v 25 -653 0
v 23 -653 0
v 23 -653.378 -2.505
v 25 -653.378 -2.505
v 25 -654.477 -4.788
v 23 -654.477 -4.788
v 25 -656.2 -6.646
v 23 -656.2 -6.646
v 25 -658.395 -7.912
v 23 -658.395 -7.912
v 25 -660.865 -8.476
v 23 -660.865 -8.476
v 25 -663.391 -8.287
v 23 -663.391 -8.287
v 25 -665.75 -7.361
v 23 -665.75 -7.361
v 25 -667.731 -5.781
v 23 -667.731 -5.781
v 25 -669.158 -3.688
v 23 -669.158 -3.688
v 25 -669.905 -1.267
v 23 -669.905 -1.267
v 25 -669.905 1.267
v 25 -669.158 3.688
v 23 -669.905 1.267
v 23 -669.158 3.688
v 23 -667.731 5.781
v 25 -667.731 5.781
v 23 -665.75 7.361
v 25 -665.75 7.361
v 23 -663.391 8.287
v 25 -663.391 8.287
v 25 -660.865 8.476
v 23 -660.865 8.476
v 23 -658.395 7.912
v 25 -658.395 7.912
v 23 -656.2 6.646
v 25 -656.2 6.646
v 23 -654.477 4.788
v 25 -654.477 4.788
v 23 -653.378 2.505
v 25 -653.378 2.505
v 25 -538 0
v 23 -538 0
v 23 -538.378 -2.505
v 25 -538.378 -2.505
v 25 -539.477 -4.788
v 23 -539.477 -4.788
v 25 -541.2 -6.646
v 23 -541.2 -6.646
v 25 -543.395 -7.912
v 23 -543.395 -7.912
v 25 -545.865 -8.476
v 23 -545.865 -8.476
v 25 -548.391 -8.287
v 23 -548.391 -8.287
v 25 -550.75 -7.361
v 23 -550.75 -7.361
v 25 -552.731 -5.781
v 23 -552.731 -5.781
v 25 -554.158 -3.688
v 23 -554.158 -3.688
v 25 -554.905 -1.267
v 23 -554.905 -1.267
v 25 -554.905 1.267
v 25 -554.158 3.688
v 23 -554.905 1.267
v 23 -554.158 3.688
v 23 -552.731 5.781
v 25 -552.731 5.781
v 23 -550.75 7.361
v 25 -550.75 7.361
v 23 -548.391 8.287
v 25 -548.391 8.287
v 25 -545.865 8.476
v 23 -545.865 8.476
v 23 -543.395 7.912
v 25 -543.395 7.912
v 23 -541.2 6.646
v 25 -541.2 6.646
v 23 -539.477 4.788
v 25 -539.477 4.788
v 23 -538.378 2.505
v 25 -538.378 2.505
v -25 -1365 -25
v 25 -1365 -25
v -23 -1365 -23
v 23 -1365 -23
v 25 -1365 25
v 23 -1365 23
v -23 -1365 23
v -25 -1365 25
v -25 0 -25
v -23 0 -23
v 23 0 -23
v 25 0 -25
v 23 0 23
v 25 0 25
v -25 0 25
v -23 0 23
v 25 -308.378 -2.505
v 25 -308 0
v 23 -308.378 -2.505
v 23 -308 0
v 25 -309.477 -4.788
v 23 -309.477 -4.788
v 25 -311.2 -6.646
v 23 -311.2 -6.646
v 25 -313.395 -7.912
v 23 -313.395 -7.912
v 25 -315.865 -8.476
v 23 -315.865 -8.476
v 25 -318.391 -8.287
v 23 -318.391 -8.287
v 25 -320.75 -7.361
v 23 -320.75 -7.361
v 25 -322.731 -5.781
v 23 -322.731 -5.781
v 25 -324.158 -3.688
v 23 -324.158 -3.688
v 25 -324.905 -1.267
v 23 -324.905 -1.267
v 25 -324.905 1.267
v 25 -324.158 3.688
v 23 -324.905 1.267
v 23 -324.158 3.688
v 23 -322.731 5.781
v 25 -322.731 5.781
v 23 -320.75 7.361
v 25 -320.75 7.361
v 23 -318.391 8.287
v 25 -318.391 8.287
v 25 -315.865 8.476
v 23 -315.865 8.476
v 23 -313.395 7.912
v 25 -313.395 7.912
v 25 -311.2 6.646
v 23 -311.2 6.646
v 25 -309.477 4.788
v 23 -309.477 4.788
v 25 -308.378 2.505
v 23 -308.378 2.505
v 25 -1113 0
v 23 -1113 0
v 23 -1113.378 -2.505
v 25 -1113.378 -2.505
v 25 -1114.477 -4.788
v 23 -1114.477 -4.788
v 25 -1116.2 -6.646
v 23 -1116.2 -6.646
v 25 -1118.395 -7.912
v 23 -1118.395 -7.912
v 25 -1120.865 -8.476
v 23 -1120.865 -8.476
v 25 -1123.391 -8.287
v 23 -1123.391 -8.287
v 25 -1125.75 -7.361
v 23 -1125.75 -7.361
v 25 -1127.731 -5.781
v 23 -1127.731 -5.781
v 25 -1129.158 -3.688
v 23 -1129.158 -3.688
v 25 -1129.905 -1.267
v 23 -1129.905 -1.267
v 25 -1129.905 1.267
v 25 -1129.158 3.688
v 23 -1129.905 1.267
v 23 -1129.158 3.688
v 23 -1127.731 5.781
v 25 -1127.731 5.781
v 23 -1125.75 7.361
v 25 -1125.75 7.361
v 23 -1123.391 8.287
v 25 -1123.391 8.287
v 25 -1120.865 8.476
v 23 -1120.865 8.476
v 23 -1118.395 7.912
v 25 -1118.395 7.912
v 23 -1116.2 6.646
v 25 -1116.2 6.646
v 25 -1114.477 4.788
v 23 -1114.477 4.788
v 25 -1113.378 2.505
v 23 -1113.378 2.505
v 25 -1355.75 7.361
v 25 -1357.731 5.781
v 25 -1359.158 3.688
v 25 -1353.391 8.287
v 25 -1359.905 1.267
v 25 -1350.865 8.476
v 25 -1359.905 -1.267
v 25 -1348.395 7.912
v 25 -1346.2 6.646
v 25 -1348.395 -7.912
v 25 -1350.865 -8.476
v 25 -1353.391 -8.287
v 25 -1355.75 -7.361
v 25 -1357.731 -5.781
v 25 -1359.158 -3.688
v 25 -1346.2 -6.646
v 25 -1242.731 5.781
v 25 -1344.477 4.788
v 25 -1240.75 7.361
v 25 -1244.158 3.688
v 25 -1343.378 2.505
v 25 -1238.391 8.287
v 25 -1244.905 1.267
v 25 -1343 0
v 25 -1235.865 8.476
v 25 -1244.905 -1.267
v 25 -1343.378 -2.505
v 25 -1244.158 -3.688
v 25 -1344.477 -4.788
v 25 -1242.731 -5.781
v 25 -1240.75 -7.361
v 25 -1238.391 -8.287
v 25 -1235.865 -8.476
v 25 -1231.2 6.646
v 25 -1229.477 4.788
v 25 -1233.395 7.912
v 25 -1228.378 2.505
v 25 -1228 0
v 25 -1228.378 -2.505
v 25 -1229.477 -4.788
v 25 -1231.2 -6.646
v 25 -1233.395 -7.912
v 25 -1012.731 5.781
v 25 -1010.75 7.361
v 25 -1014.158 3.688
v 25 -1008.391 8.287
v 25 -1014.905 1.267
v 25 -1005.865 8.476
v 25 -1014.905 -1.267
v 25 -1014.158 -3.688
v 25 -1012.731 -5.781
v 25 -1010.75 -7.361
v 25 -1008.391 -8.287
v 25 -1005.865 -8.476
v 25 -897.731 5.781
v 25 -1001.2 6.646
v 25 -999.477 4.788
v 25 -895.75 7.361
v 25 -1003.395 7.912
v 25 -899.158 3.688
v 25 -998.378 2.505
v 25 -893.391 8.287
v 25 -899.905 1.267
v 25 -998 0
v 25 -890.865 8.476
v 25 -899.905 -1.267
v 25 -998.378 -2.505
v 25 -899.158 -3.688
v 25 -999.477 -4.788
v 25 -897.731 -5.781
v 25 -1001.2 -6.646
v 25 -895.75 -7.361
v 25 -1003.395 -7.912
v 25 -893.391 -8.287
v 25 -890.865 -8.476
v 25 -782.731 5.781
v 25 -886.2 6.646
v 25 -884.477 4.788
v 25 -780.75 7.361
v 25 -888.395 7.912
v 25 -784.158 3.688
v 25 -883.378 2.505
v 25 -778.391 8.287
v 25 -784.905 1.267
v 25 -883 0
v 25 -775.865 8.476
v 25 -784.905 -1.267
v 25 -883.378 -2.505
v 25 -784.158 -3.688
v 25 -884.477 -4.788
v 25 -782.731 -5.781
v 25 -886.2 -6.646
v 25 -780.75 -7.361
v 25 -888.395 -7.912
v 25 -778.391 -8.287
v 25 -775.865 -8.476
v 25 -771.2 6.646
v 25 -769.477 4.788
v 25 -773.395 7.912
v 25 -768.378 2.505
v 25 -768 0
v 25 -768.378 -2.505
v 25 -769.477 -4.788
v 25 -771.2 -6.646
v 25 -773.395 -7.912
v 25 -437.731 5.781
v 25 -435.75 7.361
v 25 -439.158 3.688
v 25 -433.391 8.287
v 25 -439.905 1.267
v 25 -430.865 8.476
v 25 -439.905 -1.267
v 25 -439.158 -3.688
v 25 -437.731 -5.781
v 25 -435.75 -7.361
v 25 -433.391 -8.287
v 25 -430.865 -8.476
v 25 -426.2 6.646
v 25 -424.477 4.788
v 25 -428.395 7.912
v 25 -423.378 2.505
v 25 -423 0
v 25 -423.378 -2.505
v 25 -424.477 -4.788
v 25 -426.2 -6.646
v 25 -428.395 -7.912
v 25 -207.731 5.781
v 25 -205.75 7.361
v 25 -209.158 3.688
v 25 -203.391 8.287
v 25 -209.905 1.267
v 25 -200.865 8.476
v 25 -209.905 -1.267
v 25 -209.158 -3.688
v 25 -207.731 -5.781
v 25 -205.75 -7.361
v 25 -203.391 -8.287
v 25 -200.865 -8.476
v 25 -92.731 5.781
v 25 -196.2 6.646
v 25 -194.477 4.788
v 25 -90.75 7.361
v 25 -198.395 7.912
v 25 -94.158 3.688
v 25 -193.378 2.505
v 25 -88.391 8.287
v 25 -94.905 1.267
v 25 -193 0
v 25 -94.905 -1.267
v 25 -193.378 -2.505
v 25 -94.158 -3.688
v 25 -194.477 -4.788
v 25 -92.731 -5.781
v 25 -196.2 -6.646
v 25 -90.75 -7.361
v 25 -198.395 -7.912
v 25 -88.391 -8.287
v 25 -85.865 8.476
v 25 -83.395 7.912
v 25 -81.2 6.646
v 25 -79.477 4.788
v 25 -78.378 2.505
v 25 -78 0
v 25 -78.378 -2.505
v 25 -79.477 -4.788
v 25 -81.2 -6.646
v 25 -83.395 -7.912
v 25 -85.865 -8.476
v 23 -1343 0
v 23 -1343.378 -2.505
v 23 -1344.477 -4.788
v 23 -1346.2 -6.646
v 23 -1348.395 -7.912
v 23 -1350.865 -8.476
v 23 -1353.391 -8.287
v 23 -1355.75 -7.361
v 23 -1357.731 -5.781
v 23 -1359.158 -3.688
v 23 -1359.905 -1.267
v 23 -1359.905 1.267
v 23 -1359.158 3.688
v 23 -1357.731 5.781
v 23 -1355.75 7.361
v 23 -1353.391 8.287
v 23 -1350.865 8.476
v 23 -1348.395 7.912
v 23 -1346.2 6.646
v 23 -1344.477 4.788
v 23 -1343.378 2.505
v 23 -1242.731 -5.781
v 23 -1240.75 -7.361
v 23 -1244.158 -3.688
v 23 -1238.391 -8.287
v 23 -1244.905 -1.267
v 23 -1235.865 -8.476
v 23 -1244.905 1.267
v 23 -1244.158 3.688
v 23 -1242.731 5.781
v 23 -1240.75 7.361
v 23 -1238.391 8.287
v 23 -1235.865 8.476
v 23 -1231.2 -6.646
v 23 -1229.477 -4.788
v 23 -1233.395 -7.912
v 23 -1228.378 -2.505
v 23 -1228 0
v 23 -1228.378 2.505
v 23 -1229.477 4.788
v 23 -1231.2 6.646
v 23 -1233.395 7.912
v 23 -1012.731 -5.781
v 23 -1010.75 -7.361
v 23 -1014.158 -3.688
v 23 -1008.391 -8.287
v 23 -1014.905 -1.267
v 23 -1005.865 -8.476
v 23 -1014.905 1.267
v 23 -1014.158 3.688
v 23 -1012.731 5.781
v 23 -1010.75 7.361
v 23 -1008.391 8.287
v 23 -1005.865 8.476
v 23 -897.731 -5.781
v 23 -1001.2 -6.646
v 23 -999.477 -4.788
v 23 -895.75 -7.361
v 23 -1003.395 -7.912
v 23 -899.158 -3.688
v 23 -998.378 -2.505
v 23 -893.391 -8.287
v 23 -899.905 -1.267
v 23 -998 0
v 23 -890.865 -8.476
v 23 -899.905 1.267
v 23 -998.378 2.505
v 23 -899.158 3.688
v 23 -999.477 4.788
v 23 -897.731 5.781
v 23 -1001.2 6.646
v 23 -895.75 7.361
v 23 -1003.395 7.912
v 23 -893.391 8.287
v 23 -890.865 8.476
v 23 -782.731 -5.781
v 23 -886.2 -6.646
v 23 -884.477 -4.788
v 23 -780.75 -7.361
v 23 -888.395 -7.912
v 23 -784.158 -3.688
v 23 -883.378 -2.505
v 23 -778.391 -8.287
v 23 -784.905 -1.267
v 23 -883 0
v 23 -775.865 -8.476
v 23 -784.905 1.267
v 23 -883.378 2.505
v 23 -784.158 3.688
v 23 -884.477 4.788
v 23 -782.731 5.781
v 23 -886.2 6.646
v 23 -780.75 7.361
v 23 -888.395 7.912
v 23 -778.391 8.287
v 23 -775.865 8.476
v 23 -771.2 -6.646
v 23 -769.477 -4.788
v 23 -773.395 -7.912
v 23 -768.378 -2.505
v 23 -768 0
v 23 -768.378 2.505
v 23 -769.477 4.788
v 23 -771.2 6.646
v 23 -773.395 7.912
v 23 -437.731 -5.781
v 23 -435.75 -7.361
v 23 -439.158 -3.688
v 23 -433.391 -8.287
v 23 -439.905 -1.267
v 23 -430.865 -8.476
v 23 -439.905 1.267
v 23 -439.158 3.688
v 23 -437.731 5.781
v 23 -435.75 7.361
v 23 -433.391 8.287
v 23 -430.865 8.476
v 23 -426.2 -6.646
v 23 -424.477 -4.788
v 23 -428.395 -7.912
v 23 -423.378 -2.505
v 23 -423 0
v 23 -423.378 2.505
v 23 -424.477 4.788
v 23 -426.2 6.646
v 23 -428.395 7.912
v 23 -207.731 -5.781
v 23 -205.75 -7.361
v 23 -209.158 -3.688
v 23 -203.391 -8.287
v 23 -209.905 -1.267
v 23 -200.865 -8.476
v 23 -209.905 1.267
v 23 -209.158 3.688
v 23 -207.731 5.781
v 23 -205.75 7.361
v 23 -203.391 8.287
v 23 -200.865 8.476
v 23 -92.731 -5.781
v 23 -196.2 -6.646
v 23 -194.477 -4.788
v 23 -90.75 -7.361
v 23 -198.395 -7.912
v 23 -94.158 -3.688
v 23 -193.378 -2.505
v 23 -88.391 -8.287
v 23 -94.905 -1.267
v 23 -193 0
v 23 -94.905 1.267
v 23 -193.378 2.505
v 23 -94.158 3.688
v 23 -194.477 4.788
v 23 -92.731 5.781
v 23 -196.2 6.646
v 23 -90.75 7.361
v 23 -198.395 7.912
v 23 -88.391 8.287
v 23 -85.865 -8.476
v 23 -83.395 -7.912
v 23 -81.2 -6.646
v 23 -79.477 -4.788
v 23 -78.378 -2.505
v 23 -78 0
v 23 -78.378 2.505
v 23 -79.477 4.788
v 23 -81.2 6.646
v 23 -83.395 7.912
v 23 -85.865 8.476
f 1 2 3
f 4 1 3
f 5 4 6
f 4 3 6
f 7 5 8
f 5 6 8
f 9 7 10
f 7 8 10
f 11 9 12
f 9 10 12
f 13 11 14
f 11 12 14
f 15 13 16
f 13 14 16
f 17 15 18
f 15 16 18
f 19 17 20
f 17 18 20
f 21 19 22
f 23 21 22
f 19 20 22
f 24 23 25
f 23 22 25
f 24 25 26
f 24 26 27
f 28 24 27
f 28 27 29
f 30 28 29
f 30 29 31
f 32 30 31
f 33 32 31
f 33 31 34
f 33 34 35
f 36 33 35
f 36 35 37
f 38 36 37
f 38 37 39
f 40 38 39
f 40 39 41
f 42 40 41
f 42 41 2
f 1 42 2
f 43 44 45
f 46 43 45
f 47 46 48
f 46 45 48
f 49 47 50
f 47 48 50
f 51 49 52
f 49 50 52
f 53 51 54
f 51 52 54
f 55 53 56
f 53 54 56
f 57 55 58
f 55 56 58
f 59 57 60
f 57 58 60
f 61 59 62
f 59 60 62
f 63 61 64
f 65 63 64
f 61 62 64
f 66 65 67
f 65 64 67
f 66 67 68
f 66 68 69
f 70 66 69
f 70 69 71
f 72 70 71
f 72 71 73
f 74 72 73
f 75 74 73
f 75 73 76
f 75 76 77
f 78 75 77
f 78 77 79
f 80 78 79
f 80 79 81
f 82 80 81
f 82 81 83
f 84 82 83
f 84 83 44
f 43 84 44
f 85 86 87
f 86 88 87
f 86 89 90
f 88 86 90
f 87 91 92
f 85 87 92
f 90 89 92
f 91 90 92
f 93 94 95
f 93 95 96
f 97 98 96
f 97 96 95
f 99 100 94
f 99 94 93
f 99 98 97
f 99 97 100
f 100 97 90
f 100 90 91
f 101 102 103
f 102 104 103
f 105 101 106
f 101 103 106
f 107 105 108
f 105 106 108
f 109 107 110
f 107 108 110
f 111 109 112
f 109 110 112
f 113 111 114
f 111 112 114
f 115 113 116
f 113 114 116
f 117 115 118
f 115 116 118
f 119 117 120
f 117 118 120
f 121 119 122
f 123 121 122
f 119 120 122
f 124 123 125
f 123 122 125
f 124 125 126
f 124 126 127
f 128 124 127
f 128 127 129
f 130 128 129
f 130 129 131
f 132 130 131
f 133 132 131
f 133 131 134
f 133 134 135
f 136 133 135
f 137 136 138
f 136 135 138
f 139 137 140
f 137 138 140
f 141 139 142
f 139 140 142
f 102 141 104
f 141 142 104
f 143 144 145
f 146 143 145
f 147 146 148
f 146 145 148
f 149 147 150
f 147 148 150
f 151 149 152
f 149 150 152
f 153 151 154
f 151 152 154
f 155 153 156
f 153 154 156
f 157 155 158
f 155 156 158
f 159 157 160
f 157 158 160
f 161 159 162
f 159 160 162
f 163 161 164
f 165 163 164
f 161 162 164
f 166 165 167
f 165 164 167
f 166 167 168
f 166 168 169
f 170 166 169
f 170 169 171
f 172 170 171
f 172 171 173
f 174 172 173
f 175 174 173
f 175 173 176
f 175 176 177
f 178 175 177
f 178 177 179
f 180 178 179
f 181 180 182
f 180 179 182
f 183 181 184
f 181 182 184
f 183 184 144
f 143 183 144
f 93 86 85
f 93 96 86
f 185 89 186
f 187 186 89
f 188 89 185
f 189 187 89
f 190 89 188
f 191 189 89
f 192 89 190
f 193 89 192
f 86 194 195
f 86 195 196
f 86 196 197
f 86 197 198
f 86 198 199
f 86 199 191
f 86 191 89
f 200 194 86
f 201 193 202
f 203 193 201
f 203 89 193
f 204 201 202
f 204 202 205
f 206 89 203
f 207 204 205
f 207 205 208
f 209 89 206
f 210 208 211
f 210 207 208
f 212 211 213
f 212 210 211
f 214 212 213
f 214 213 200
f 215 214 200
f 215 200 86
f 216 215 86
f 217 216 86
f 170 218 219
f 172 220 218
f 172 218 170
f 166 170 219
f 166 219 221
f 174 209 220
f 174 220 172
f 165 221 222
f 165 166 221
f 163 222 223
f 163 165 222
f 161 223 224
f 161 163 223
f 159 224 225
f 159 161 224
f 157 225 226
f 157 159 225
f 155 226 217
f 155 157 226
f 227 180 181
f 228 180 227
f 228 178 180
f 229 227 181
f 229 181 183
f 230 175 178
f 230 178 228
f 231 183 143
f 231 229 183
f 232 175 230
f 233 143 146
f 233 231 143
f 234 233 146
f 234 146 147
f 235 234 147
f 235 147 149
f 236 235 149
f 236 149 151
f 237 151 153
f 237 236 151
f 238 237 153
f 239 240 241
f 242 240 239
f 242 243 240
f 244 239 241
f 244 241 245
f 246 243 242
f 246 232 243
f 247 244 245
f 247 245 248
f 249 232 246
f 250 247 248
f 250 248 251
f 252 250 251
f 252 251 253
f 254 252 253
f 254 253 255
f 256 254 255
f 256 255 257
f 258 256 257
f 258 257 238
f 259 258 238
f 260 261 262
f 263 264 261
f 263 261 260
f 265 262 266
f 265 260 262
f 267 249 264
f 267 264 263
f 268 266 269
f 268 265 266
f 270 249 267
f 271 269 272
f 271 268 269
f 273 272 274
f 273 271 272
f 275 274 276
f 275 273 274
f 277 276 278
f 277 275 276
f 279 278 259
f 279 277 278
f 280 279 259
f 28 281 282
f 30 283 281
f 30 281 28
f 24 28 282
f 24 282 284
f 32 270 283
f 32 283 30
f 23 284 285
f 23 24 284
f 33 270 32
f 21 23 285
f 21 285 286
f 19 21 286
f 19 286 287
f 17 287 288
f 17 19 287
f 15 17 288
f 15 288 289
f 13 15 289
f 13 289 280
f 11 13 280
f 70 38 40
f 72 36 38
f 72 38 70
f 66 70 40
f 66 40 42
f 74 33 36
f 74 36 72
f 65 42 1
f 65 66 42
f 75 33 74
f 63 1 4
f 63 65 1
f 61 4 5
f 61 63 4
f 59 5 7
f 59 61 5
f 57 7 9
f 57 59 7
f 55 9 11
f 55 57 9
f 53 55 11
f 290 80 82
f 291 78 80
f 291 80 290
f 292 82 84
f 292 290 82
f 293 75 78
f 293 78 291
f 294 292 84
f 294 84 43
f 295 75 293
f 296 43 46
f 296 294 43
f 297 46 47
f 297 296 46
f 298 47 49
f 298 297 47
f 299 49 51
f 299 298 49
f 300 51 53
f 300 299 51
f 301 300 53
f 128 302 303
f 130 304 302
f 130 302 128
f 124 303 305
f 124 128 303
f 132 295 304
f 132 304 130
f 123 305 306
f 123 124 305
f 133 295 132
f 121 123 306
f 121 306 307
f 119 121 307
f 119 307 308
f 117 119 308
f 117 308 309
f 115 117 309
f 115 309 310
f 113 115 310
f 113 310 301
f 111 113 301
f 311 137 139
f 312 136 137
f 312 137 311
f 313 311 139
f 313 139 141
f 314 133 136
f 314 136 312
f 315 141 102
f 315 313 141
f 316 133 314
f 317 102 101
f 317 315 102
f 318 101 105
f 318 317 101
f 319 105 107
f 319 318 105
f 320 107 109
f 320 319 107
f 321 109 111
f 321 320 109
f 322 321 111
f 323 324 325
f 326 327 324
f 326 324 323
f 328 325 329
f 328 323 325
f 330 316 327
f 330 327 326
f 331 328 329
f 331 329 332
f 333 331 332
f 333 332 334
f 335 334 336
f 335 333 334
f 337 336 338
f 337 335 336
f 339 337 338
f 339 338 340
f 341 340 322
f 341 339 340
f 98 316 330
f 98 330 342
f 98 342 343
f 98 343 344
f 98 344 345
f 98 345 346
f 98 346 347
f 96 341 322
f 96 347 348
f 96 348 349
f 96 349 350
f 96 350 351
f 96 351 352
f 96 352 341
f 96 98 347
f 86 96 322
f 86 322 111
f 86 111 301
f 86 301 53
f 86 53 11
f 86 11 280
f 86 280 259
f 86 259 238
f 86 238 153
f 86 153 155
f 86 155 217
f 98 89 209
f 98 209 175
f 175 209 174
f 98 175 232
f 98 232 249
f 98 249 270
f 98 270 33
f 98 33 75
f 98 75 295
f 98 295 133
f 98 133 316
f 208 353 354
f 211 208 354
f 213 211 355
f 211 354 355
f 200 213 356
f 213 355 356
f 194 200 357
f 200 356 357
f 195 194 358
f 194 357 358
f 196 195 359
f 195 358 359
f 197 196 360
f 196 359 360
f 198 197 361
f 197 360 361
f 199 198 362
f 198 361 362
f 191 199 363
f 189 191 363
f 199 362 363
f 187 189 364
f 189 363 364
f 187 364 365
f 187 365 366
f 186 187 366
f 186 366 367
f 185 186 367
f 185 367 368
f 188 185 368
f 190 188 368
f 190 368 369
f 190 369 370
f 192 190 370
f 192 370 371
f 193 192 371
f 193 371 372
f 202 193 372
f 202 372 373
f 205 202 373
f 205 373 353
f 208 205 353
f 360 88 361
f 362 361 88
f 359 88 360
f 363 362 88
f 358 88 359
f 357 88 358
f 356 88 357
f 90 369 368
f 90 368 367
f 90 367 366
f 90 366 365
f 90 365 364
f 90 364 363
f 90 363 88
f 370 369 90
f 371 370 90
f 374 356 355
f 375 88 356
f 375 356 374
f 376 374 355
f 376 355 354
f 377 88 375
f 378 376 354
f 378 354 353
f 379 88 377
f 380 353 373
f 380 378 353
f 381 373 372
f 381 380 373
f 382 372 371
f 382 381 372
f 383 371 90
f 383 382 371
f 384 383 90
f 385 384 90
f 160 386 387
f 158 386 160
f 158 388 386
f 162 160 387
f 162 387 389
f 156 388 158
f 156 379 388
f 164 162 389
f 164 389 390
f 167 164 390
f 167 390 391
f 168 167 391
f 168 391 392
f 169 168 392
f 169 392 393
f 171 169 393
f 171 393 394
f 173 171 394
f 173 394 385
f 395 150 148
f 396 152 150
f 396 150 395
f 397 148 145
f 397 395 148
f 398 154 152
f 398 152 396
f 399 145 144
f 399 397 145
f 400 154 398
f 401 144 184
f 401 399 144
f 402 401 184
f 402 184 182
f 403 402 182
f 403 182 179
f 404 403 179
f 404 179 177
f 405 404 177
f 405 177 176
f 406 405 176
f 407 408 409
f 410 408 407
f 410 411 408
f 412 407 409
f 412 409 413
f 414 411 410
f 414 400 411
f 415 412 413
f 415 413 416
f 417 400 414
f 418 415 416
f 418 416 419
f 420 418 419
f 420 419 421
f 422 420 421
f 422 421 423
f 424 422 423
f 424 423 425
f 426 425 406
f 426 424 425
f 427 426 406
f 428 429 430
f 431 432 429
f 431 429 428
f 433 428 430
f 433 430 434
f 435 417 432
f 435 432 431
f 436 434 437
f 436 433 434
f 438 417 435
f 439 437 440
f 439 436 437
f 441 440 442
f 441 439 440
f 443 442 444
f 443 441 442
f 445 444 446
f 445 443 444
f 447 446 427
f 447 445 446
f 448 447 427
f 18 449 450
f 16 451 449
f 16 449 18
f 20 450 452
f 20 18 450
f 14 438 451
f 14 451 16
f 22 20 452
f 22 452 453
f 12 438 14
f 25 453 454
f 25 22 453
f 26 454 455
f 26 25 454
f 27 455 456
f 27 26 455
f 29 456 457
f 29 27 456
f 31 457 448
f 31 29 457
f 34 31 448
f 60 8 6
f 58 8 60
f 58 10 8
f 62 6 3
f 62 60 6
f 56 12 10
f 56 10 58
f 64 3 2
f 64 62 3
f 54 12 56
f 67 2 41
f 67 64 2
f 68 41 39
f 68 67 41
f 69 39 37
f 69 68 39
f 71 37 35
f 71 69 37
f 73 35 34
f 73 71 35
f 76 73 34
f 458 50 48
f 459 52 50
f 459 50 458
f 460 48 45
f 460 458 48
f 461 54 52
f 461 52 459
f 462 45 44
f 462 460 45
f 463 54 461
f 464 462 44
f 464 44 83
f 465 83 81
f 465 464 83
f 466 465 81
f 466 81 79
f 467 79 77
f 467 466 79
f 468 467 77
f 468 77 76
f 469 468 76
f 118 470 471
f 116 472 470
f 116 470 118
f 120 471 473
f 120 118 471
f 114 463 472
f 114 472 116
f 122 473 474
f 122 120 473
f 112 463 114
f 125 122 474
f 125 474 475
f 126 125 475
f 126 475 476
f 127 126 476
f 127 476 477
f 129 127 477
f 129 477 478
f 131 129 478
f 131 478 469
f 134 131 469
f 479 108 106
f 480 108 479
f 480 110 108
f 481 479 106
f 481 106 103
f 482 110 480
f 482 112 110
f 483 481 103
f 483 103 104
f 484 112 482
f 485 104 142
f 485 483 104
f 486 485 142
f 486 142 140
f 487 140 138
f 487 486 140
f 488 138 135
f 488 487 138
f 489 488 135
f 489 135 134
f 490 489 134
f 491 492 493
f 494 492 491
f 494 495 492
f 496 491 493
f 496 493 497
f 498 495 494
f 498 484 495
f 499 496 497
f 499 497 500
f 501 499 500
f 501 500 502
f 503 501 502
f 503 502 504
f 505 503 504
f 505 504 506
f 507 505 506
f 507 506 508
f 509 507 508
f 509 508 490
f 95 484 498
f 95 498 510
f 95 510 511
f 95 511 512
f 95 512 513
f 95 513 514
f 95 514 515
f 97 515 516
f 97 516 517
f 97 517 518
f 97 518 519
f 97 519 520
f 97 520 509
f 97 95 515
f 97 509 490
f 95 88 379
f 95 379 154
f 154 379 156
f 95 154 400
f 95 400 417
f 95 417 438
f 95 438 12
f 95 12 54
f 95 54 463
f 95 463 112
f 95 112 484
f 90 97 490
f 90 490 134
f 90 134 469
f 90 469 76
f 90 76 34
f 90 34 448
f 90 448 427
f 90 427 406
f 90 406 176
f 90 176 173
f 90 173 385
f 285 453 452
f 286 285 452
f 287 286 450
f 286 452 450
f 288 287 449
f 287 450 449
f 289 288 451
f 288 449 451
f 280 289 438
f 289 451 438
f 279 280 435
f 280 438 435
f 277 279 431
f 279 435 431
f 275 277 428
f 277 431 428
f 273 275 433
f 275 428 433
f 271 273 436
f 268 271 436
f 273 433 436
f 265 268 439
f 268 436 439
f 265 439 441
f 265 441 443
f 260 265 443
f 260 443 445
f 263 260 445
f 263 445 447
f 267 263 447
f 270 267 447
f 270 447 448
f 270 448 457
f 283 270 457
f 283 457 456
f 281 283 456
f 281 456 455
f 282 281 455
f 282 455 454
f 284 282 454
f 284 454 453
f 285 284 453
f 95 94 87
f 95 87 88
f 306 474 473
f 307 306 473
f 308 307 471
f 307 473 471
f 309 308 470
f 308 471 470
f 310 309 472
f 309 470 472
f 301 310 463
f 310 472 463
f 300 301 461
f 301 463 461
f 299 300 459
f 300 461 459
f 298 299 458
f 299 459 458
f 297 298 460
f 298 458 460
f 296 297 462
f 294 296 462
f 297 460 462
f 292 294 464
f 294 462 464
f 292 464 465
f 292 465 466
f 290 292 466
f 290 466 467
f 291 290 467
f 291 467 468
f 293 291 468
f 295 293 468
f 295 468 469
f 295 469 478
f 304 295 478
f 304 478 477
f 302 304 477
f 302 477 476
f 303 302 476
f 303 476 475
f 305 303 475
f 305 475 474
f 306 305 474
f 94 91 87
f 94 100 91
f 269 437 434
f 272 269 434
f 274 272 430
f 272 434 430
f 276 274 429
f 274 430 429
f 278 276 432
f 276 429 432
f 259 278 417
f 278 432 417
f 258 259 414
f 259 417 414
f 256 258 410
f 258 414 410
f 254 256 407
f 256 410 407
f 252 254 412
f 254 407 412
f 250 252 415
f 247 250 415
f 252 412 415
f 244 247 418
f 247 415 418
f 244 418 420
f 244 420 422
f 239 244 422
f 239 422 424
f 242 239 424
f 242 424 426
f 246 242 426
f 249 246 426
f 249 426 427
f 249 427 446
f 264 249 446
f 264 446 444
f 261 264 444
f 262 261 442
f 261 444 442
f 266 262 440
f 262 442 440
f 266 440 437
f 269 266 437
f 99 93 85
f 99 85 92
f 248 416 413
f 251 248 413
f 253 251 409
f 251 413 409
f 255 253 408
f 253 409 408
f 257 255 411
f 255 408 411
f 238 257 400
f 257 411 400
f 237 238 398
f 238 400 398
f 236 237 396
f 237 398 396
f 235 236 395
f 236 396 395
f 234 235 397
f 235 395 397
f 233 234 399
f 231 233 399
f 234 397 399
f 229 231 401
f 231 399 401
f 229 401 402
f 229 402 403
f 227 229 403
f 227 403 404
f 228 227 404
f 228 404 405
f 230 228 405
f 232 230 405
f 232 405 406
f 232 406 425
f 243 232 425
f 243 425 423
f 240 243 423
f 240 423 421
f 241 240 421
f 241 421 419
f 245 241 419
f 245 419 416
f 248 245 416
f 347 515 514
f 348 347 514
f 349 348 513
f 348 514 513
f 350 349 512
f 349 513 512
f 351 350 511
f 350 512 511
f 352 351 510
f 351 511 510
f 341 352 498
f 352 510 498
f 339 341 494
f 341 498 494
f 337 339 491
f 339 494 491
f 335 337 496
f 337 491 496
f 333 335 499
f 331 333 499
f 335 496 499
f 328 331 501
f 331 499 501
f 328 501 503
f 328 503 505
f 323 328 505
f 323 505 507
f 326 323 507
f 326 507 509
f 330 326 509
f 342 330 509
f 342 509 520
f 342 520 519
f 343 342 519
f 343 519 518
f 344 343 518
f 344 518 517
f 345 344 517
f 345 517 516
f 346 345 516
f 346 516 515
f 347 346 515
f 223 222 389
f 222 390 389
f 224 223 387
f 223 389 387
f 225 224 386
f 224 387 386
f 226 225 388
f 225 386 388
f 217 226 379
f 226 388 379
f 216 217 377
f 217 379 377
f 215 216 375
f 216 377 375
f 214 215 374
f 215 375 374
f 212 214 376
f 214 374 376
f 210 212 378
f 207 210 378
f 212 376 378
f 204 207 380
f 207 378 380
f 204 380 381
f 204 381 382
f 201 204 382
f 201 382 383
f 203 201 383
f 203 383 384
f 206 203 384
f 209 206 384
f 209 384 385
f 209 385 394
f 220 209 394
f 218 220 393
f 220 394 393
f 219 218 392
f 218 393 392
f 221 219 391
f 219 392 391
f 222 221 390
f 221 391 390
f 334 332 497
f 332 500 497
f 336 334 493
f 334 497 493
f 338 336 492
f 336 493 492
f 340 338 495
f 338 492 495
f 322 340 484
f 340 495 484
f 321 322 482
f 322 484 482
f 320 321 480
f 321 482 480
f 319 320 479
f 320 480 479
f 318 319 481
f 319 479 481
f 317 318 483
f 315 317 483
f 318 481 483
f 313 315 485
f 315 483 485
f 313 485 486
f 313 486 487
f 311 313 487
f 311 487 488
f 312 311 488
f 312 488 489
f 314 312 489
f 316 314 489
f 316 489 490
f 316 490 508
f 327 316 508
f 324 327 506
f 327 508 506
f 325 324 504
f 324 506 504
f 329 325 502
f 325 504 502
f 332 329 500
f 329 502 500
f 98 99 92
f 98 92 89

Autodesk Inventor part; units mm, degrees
ref_plane "YZ Plane" through (0, 0, 0) normal (1, 0, 0) x (0, 1, 0)
ref_plane "XZ Plane" through (0, 0, 0) normal (0, 1, 0) x (-1, 0, 0)
ref_plane "XY Plane" through (0, 0, 0) normal (0, 0, 1) x (1, 0, 0)
sketch "Sketch9" plane through (0, 0, 0) normal (0, 1, 0) x (-1, 0, 0)
  line L0 (25, 25) -> (-25, 25)
  line L1 (-25, 25) -> (-25, -25)
  line L2 (-25, -25) -> (25, -25)
  line L3 (25, -25) -> (25, 25)
  line L4 (25, 25) -> (-25, -25) construction
  line L5 (-25, 25) -> (25, -25) construction
  line L6 (-23, 23) -> (23, 23)
  line L7 (23, 23) -> (23, -23)
  line L8 (23, -23) -> (-23, -23)
  line L9 (-23, -23) -> (-23, 23)
  point P0 (0, 0)
  dimension "d172" = 50
  dimension "d173" = 50
  dimension "d174" = 2
extrude "Extrusion3" add sketch "Sketch9" against normal blind 1365
sketch "Sketch10" plane through (0, 0, 0) normal (1, 0, 0) x (0, 1, 0)
  line L0 (0, 25) -> (0, -25) construction
  line L1 (0, 25) -> (-1365, 25) construction
  line L2 (-1365, -25) -> (-1365, 25) construction
  line L3 (0, -25) -> (-1365, -25) construction
  line L4 (-1360, 8.5) -> (-1343, 8.5)
  line L5 (-1343, 8.5) -> (-1343, -8.5)
  line L6 (-1343, -8.5) -> (-1360, -8.5)
  line L7 (-1360, -8.5) -> (-1360, 8.5)
  line L8 (-1360, 8.5) -> (-1343, -8.5) construction
  line L9 (-1343, 8.5) -> (-1360, -8.5) construction
  circle A0 centre (-1351.5, 0) radius 8.5
  line L10 (0, 25) -> (0, -25) projected
  point P0 (0, 0)
  point P1 (0, 0)
  point P2 (-1365, 0)
  dimension "d177" = 17
  dimension "d178" = 17
  dimension "d191" = 5
extrude "Extrusion4" cut sketch "Sketch10" along normal through all contours A0
pattern_linear "Rectangular Pattern4" count 12 spacing 115 along (0, 1, 0) of "Extrusion4"
properties part number "TKS 3531 FDS WAY tube1" material "Stainless Steel"
